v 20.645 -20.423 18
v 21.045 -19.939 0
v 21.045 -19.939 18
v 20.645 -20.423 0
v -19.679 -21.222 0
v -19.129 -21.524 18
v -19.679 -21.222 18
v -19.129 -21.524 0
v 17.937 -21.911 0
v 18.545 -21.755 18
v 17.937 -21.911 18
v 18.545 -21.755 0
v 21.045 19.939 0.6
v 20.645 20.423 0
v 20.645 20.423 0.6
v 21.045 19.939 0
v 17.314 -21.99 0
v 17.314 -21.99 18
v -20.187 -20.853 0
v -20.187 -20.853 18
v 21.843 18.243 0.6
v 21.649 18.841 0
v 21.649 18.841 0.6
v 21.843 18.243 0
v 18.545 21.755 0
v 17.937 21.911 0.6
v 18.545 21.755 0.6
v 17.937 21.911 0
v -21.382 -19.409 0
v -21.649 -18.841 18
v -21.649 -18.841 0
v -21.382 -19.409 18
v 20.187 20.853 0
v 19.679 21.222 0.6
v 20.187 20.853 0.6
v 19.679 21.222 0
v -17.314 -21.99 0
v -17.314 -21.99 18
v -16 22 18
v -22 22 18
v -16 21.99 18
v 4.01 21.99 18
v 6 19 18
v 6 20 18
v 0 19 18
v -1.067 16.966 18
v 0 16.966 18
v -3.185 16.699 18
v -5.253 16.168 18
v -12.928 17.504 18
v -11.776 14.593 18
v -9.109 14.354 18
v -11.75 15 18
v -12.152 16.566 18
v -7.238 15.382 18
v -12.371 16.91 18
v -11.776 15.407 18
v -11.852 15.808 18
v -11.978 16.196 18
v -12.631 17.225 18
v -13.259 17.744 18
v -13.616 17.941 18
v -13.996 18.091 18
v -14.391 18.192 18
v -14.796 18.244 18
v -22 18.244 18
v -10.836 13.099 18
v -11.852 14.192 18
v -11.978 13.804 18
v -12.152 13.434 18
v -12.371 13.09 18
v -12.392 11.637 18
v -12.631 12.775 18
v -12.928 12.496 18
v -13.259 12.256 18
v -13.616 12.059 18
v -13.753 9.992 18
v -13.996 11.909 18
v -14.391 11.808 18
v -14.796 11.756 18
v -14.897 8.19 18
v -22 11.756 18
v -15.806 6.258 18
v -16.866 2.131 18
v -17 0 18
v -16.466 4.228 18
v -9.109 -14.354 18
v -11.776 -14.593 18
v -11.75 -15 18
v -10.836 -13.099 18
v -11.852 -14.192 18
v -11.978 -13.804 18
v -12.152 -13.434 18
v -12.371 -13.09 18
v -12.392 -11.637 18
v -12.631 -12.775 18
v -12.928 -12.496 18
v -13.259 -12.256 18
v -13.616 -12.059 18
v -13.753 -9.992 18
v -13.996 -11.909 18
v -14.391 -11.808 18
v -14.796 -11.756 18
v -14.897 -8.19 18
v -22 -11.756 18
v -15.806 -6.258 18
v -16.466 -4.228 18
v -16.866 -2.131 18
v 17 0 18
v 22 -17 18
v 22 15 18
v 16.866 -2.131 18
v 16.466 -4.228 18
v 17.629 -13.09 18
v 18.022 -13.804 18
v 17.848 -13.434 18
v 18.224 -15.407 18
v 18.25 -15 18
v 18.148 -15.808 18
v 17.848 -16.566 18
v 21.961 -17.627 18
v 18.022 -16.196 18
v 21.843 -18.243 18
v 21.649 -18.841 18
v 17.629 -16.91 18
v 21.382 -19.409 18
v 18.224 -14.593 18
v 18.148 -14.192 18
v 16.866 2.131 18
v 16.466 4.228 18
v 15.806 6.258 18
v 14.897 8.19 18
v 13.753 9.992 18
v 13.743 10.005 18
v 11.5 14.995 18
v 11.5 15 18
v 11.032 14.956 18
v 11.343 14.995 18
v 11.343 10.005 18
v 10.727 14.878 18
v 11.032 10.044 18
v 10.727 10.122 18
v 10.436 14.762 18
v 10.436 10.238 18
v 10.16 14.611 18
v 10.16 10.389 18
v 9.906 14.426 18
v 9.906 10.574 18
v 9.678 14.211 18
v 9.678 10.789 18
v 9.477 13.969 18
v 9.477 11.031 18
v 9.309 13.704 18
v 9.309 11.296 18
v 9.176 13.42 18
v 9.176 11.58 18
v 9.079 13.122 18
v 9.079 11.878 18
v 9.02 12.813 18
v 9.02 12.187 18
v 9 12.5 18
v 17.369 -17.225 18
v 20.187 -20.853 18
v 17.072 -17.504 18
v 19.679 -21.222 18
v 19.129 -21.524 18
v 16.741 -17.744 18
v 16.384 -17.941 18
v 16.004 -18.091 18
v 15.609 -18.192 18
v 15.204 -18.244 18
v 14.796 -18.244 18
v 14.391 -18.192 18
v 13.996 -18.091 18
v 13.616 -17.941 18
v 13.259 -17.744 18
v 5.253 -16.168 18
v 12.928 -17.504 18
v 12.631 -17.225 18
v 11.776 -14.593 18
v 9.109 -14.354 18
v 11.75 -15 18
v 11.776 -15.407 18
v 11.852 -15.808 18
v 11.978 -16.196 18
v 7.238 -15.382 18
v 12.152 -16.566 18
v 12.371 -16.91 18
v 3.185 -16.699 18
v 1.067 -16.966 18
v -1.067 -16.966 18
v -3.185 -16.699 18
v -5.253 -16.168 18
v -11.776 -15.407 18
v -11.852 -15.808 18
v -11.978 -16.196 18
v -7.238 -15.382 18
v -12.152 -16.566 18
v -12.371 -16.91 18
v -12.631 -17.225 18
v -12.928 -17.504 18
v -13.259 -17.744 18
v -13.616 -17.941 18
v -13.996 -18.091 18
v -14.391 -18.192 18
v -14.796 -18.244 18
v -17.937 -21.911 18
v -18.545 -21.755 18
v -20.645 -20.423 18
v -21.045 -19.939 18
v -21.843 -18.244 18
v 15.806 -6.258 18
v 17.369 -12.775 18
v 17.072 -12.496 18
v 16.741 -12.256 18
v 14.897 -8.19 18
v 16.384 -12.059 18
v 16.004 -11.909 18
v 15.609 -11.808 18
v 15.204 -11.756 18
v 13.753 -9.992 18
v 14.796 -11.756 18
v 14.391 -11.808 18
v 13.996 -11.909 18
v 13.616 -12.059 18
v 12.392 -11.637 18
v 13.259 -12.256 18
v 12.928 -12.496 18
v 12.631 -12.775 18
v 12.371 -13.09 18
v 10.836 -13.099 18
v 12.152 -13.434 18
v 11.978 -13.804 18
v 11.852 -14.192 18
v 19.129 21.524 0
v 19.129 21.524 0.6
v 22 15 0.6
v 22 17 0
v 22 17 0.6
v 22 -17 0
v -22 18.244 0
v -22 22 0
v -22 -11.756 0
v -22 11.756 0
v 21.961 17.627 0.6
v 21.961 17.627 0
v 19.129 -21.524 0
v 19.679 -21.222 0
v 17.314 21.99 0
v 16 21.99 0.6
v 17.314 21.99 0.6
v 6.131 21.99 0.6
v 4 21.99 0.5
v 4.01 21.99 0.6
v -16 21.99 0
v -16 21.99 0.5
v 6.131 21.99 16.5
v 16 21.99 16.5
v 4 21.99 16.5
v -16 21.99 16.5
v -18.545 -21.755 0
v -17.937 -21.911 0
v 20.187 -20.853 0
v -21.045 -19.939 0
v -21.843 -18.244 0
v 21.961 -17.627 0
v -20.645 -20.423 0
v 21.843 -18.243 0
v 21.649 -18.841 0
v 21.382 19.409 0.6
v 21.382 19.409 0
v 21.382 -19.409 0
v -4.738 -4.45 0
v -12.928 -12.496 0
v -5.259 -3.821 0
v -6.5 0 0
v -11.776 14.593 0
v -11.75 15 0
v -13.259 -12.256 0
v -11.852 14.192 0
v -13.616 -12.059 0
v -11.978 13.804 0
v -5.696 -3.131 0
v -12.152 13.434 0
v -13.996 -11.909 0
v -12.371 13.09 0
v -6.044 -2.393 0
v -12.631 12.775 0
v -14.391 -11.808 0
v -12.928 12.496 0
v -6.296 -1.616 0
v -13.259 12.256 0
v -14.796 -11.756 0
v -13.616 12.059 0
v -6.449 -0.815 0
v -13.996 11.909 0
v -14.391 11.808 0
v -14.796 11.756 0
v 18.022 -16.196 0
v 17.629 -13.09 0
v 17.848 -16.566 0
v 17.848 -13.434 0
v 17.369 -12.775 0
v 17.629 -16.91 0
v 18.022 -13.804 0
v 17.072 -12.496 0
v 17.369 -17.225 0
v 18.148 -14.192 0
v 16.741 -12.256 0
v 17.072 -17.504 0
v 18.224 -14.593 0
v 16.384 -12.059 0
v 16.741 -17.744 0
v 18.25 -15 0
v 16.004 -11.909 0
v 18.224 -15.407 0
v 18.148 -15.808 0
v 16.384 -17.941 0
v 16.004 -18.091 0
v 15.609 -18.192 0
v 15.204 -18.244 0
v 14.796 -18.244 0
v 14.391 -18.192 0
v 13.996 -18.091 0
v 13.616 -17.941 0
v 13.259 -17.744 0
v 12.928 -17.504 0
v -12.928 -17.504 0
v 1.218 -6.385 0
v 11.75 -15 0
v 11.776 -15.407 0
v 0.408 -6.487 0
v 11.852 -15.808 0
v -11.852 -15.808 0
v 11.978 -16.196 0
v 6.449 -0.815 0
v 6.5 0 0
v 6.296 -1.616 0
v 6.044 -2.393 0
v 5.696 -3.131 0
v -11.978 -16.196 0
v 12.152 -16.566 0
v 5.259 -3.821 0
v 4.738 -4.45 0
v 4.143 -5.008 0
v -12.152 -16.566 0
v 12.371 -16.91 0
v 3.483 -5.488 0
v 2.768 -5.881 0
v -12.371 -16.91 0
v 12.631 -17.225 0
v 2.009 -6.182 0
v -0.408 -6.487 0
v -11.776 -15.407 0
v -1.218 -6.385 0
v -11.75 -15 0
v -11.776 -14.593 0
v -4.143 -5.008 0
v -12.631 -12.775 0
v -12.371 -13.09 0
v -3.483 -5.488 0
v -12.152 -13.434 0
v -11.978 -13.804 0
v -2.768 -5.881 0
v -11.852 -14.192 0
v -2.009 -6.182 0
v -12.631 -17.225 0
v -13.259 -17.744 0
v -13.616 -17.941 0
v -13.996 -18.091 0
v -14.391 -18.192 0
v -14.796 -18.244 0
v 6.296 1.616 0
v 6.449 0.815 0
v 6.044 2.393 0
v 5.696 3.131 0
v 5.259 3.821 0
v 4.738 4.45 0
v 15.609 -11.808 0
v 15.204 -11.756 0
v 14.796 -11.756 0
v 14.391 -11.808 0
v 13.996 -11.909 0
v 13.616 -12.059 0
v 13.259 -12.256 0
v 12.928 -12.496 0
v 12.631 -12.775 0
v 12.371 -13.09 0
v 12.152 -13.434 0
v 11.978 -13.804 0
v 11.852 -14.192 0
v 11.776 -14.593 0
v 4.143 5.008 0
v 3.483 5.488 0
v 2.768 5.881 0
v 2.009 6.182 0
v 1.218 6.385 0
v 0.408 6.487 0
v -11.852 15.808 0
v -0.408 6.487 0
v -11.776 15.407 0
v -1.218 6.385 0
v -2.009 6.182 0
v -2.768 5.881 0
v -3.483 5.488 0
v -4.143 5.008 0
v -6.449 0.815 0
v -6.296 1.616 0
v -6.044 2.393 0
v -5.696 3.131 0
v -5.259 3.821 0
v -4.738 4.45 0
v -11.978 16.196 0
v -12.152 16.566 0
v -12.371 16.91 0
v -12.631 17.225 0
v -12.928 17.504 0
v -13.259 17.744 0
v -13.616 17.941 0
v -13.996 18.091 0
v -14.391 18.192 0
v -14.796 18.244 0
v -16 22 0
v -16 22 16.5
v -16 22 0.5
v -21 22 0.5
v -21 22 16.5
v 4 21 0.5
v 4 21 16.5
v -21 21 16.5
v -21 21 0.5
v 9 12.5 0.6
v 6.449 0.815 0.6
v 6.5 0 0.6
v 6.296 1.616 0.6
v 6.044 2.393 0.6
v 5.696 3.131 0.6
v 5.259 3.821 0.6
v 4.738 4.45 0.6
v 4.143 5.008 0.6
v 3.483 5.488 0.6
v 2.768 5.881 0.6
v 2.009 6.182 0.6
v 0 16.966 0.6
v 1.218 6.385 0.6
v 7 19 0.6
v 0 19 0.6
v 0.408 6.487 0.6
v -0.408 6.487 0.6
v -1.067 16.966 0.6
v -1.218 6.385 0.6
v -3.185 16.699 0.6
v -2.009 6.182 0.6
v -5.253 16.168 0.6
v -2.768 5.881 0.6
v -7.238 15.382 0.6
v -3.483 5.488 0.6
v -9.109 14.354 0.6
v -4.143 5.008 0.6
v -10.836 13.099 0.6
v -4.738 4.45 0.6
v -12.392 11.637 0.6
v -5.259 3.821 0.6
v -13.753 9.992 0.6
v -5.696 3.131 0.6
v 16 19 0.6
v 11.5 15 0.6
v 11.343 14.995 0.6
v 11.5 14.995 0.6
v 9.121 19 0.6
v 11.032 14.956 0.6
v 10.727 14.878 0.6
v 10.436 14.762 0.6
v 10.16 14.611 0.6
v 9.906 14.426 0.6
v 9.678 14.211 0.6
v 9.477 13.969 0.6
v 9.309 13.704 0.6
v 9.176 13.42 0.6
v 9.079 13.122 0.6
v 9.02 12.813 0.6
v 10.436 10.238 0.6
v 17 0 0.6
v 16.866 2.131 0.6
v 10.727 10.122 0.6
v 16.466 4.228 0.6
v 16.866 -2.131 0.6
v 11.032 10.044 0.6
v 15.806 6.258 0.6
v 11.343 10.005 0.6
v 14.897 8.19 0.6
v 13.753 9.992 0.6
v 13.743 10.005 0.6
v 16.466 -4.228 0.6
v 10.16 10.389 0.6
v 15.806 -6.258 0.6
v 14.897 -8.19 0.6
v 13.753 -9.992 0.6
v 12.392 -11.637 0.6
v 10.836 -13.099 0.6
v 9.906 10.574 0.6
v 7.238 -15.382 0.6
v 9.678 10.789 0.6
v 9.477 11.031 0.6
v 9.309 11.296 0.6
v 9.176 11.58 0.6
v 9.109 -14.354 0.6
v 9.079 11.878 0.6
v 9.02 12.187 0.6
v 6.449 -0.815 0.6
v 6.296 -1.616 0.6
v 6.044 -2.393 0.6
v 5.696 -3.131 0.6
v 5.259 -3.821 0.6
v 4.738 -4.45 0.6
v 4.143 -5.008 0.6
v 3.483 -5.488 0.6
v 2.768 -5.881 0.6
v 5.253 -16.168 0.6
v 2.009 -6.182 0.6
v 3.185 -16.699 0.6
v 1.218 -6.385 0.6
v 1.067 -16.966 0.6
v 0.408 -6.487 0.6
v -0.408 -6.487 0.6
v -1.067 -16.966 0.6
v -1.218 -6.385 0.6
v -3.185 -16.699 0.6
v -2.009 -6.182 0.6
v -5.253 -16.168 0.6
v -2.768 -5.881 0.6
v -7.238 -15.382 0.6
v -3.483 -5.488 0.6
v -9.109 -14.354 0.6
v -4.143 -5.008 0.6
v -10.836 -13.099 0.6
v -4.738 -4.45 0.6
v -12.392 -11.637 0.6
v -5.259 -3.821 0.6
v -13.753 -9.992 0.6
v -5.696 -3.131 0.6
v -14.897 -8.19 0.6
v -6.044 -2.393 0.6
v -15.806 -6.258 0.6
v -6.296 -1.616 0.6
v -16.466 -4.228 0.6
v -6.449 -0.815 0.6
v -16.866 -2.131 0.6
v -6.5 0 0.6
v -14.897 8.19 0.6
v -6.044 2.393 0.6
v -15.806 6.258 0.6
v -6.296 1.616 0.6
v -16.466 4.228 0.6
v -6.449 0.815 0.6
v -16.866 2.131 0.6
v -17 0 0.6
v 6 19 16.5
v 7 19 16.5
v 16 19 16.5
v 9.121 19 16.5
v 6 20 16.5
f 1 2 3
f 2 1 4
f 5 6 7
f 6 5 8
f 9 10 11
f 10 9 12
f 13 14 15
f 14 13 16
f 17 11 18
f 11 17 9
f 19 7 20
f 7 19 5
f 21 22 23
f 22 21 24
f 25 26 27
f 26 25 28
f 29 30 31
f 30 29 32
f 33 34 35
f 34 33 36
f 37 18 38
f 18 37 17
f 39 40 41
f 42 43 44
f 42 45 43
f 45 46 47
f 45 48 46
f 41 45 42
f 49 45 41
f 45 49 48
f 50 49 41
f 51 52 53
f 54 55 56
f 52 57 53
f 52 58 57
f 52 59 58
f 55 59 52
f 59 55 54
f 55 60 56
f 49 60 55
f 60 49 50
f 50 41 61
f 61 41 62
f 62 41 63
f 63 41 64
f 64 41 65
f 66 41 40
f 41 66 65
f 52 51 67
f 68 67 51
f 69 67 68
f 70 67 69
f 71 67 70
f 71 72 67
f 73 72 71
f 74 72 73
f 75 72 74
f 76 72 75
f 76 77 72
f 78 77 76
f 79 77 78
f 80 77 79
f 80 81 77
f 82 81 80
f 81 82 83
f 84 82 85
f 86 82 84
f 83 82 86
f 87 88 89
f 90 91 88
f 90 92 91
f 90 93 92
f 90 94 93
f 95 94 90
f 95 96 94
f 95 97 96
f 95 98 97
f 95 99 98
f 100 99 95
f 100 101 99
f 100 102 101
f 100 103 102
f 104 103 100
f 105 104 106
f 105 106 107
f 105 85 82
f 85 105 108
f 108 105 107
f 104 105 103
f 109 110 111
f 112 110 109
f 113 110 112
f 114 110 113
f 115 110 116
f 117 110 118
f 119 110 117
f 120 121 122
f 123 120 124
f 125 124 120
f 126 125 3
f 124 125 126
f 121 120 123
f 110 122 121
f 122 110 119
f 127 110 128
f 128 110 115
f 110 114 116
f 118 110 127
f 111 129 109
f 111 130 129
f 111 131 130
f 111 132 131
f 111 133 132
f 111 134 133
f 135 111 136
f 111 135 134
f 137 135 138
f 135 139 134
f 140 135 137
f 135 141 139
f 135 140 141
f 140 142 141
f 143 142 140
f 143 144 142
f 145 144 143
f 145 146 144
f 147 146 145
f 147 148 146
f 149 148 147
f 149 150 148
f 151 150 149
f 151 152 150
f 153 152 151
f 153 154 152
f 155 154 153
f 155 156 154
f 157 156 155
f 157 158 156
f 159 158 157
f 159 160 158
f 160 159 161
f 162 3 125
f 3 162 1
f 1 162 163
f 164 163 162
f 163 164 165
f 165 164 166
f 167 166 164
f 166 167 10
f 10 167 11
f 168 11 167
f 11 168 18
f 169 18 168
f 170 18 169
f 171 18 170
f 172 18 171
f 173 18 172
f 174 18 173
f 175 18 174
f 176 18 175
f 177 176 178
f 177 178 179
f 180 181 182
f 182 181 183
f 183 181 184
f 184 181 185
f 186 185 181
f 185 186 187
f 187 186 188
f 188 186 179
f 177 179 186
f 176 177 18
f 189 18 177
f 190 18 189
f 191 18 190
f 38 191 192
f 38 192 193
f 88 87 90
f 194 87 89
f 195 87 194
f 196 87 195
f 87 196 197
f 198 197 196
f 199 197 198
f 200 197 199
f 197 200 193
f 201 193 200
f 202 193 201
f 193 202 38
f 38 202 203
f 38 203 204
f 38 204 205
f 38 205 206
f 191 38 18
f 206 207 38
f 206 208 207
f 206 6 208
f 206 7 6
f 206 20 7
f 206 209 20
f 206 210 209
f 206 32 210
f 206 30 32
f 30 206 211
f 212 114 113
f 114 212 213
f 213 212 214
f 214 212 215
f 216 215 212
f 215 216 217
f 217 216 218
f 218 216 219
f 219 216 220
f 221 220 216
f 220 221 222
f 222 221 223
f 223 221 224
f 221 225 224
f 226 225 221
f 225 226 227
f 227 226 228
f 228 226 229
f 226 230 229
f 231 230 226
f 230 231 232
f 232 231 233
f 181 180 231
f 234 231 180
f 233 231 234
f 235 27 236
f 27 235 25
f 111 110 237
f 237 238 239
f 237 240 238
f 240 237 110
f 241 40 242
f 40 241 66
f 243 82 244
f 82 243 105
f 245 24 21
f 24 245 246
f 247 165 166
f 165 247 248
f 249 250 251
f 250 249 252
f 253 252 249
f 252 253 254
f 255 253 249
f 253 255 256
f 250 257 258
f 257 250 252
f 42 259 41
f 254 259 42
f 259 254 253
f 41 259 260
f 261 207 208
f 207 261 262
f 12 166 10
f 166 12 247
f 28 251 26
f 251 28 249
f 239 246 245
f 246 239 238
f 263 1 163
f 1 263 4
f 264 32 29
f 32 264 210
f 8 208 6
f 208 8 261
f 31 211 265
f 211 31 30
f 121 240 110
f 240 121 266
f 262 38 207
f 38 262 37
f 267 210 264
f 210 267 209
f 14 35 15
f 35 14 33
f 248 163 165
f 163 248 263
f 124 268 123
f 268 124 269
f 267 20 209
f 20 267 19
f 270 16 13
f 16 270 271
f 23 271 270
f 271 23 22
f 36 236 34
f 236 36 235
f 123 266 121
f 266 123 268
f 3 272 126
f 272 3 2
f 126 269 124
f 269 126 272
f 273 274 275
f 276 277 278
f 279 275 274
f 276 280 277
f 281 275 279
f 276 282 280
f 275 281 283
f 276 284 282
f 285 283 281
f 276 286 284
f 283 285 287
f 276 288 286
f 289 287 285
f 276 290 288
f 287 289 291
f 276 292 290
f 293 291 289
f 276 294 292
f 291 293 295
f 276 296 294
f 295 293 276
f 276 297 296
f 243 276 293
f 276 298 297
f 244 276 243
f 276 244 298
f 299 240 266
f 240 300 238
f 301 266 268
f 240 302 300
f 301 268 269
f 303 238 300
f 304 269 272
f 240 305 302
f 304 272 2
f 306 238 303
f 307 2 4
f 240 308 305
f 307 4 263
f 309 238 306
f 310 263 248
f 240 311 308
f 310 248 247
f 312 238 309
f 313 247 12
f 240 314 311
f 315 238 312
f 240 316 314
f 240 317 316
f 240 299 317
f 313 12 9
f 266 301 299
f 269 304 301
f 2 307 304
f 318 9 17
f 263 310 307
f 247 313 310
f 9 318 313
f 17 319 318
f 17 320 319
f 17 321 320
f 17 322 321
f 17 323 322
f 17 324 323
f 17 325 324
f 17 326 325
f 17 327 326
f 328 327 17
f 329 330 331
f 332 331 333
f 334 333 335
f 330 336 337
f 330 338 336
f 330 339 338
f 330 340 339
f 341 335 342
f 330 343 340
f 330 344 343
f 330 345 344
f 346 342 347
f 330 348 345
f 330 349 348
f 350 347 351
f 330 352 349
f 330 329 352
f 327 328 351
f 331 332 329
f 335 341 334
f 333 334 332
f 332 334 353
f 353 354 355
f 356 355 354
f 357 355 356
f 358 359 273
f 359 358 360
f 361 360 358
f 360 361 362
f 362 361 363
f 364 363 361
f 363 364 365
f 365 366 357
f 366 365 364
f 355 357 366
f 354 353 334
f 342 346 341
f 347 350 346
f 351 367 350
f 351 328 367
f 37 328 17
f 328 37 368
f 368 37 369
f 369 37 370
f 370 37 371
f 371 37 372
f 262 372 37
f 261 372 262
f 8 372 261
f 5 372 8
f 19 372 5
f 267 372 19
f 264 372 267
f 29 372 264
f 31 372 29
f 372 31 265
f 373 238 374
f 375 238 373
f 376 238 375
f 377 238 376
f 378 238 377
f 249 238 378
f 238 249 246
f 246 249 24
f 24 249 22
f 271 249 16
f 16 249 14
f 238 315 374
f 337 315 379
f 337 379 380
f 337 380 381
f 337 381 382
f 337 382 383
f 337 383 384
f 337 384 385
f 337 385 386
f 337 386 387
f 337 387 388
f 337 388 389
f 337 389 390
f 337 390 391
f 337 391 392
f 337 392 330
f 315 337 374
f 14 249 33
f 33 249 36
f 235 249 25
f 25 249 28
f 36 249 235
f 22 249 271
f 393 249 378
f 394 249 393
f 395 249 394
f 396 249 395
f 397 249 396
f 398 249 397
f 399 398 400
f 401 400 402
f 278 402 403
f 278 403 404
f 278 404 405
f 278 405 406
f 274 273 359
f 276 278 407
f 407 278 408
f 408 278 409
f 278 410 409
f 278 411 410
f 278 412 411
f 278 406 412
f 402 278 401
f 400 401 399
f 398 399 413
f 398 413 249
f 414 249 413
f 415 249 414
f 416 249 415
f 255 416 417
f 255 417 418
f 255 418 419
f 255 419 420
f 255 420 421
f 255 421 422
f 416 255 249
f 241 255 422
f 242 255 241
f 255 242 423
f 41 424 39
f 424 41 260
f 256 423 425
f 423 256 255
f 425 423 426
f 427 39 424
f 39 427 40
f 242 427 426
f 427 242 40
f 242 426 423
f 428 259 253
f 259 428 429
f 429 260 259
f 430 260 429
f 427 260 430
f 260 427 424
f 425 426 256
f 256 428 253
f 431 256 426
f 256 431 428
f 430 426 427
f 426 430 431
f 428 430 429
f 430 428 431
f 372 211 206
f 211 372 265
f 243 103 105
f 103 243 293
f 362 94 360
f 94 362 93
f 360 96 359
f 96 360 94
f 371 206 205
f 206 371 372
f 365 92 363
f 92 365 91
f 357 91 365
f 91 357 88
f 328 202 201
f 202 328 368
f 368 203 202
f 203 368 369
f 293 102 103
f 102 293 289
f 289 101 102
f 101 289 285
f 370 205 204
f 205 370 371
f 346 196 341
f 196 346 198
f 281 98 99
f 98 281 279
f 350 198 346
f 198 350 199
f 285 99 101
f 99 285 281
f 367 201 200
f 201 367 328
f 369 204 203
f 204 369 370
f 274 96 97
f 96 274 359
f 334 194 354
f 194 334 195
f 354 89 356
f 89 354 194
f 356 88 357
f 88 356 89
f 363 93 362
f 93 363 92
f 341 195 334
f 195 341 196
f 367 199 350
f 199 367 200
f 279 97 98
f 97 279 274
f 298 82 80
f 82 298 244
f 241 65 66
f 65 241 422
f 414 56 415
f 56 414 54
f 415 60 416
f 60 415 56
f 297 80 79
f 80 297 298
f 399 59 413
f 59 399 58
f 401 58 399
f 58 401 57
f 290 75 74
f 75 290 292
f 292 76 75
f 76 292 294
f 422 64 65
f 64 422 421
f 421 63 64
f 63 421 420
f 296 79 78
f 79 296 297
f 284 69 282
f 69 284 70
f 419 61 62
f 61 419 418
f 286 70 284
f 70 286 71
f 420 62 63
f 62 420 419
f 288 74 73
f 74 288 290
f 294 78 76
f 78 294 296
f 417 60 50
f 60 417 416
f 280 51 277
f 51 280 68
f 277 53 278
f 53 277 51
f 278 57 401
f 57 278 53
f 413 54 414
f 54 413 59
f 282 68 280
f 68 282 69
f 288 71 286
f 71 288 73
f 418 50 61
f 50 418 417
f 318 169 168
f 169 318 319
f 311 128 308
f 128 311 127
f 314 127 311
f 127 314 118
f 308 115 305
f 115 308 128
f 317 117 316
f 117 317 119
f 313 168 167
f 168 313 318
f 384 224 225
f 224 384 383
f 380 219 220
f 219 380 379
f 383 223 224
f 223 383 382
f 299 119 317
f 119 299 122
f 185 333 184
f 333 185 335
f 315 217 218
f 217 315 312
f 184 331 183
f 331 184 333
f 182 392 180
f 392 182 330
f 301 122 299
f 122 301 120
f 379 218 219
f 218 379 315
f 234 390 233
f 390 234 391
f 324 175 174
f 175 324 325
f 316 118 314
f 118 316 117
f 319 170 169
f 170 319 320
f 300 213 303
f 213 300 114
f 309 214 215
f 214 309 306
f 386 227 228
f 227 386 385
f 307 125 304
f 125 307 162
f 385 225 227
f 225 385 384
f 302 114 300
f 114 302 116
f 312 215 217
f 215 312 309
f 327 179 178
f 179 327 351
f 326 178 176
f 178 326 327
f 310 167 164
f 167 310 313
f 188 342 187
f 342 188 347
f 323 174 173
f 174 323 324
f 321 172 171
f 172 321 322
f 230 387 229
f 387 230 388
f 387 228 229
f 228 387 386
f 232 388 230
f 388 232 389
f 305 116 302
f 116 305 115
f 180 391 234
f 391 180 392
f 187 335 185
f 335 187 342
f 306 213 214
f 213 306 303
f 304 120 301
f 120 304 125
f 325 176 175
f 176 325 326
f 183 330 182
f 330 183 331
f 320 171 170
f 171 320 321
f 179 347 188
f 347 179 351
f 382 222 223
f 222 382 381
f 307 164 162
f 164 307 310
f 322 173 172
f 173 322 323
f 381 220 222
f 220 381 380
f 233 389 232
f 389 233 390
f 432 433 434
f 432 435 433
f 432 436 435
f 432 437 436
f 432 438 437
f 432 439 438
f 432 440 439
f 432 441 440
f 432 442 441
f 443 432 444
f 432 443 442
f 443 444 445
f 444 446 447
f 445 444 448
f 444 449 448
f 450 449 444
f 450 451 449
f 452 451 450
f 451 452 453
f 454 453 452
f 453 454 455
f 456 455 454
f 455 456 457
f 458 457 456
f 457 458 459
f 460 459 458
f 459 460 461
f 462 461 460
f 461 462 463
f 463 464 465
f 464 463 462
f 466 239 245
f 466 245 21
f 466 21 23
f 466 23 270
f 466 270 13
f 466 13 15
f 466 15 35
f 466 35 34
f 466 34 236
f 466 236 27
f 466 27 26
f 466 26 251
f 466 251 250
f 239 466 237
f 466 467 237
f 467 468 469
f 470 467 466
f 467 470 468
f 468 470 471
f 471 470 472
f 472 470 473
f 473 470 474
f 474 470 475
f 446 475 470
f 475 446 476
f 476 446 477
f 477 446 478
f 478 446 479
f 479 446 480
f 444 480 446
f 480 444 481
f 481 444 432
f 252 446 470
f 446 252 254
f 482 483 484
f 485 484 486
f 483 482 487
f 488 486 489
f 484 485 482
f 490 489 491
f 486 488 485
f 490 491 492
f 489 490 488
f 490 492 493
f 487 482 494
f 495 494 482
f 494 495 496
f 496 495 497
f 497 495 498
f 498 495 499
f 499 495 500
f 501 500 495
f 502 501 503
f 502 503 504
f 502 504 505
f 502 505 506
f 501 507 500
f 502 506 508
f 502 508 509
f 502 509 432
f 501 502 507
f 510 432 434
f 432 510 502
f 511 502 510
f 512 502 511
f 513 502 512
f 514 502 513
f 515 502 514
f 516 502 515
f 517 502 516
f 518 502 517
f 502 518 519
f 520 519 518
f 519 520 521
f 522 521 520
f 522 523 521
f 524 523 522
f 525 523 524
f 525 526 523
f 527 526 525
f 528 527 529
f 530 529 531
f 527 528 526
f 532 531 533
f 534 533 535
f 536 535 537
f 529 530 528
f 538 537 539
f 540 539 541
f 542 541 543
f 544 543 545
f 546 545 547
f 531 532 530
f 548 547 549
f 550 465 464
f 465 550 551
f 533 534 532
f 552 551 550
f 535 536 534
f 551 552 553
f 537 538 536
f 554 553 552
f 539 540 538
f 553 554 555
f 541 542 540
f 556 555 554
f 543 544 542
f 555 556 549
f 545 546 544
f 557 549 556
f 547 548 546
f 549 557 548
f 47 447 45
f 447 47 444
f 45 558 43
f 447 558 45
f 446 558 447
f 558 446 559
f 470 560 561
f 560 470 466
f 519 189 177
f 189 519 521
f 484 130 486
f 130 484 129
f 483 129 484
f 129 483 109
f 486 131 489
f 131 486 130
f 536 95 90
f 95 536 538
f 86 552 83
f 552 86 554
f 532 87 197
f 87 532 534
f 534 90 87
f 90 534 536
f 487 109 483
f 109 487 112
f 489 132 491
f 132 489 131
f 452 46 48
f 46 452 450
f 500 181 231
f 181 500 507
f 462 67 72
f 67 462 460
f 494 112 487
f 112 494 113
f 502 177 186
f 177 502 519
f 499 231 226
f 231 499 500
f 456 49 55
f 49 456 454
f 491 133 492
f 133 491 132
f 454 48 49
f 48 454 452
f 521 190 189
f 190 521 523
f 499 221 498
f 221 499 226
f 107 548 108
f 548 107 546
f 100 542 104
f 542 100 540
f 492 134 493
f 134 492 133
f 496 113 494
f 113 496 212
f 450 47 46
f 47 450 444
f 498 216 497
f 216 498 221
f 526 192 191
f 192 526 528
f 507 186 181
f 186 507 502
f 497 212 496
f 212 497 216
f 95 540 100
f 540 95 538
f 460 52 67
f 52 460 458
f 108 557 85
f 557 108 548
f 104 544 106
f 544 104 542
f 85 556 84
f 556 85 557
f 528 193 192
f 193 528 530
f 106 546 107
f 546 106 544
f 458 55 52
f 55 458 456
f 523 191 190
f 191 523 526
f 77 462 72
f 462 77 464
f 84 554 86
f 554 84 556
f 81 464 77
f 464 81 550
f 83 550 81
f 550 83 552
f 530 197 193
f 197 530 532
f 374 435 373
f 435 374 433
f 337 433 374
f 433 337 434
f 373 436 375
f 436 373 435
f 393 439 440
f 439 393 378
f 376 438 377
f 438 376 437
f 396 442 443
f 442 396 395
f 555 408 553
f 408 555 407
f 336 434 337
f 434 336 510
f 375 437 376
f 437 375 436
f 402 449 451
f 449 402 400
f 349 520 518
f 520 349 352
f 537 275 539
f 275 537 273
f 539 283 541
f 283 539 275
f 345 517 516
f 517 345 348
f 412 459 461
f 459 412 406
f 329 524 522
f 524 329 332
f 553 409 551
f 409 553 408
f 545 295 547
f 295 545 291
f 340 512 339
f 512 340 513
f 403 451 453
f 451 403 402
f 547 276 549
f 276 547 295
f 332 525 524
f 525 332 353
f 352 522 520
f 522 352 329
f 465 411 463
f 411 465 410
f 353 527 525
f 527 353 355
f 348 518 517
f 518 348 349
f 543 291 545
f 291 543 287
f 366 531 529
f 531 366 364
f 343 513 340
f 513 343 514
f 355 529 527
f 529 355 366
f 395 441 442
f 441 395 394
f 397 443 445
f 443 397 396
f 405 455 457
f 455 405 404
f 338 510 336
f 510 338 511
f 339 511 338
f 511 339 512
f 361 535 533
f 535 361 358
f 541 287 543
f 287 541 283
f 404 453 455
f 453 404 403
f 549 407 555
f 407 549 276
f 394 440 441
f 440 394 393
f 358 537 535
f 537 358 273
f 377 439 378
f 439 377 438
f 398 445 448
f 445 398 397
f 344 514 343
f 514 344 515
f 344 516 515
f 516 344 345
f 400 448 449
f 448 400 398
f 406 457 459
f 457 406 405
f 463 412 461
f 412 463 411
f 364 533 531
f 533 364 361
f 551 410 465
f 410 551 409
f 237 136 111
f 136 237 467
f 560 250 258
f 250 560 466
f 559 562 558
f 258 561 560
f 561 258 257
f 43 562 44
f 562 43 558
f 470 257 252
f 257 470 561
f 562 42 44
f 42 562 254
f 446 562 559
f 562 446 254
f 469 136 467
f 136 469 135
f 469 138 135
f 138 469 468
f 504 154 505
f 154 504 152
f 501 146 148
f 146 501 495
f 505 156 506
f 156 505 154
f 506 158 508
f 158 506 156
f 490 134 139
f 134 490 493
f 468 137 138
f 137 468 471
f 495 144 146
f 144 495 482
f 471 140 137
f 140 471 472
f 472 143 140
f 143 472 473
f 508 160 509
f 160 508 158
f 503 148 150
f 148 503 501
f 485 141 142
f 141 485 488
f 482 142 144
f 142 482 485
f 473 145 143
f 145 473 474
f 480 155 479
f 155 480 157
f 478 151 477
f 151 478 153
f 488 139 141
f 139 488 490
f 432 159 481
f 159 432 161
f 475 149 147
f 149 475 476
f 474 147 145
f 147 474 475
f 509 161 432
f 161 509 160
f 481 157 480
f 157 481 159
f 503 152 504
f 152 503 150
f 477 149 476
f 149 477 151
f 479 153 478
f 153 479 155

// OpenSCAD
$fn = 50;


union() {
	difference() {
		union() {
			translate(v = [0, 0, 0]) {
				rotate(a = [0, 0, 0]) {
					hull() {
						translate(v = [-17.0000000000, 17.0000000000, 0]) {
							rotate(a = [0, 0, 0]) {
								translate(v = [0, 0, 0]) {
									rotate(a = [0, 0, 0]) {
										cylinder(h = 18, r = 5);
									}
								}
							}
						}
						translate(v = [17.0000000000, 17.0000000000, 0]) {
							rotate(a = [0, 0, 0]) {
								translate(v = [0, 0, 0]) {
									rotate(a = [0, 0, 0]) {
										cylinder(h = 18, r = 5);
									}
								}
							}
						}
						translate(v = [-17.0000000000, -17.0000000000, 0]) {
							rotate(a = [0, 0, 0]) {
								translate(v = [0, 0, 0]) {
									rotate(a = [0, 0, 0]) {
										cylinder(h = 18, r = 5);
									}
								}
							}
						}
						translate(v = [17.0000000000, -17.0000000000, 0]) {
							rotate(a = [0, 0, 0]) {
								translate(v = [0, 0, 0]) {
									rotate(a = [0, 0, 0]) {
										cylinder(h = 18, r = 5);
									}
								}
							}
						}
					}
				}
			}
			translate(v = [-22.0000000000, 16.0000000000, 0]) {
				rotate(a = [0, 0, 0]) {
					cube(size = [6, 6, 18]);
				}
			}
		}
		union() {
			#translate(v = [-21.0000000000, 21.0000000000, 0.5000000000]) {
				rotate(a = [0, 0, 0]) {
					cube(size = [25, 1, 16]);
				}
			}
			translate(v = [-22.5000000000, -15.0000000000, -125]) {
				rotate(a = [0, 0, 0]) {
					hull() {
						translate(v = [7.5000000000, 0, 0]) {
							rotate(a = [0, 0, 0]) {
								translate(v = [0, 0, 0]) {
									rotate(a = [0, 0, 0]) {
										cylinder(h = 250, r = 3.2500000000);
									}
								}
							}
						}
						translate(v = [-7.5000000000, 0, 0]) {
							rotate(a = [0, 0, 0]) {
								translate(v = [0, 0, 0]) {
									rotate(a = [0, 0, 0]) {
										cylinder(h = 250, r = 3.2500000000);
									}
								}
							}
						}
					}
				}
			}
			translate(v = [-22.5000000000, 15.0000000000, -125]) {
				rotate(a = [0, 0, 0]) {
					hull() {
						translate(v = [7.5000000000, 0, 0]) {
							rotate(a = [0, 0, 0]) {
								translate(v = [0, 0, 0]) {
									rotate(a = [0, 0, 0]) {
										cylinder(h = 250, r = 3.2500000000);
									}
								}
							}
						}
						translate(v = [-7.5000000000, 0, 0]) {
							rotate(a = [0, 0, 0]) {
								translate(v = [0, 0, 0]) {
									rotate(a = [0, 0, 0]) {
										cylinder(h = 250, r = 3.2500000000);
									}
								}
							}
						}
					}
				}
			}
			translate(v = [15.0000000000, -15.0000000000, -125.0000000000]) {
				rotate(a = [0, 0, 0]) {
					cylinder(h = 250, r = 3.2500000000);
				}
			}
			translate(v = [0.0000000000, 11.0000000000, 0.6000000000]) {
				rotate(a = [0, 0, 0]) {
					cube(size = [11, 8, 20.4000000000]);
				}
			}
			translate(v = [0, 0, 0.6000000000]) {
				rotate(a = [0, 0, 0]) {
					cylinder(h = 20.4000000000, r = 17.0000000000);
				}
			}
			translate(v = [0, 0, -9.0000000000]) {
				rotate(a = [0, 0, 0]) {
					cylinder(h = 18, r = 6.5000000000);
				}
			}
			translate(v = [0.0000000000, 15.0000000000, 0.6000000000]) {
				rotate(a = [0, 0, 0]) {
					cube(size = [22.0000000000, 4, 20.4000000000]);
				}
			}
			translate(v = [16.0000000000, 15.0000000000, 0.6000000000]) {
				rotate(a = [0, 0, 0]) {
					cube(size = [6, 7, 20.4000000000]);
				}
			}
			translate(v = [6.0000000000, 15.0000000000, 16.5000000000]) {
				rotate(a = [0, 0, 0]) {
					cube(size = [16, 7, 1.5000000000]);
				}
			}
			translate(v = [3.2500000000, 22.7500000000, 0.6000000000]) {
				rotate(a = [0, 0, -45]) {
					cube(size = [7.5000000000, 1.5000000000, 20.4000000000]);
				}
			}
			translate(v = [2.5000000000, 10.0000000000, 0.6000000000]) {
				rotate(a = [0, 0, 0]) {
					cube(size = [9.0000000000, 5, 17.4000000000]);
				}
			}
		}
	}
	union() {
		translate(v = [14, 12.5000000000, 0]) {
			rotate(a = [0, 0, 0]) {
				hull() {
					translate(v = [2.5000000000, 0, 0]) {
						rotate(a = [0, 0, 0]) {
							#translate(v = [0, 0, 0]) {
								rotate(a = [0, 0, 0]) {
									cylinder(h = 18, r = 2.5000000000);
								}
							}
						}
					}
					translate(v = [-2.5000000000, 0, 0]) {
						rotate(a = [0, 0, 0]) {
							#translate(v = [0, 0, 0]) {
								rotate(a = [0, 0, 0]) {
									cylinder(h = 18, r = 2.5000000000);
								}
							}
						}
					}
				}
			}
		}
	}
}
